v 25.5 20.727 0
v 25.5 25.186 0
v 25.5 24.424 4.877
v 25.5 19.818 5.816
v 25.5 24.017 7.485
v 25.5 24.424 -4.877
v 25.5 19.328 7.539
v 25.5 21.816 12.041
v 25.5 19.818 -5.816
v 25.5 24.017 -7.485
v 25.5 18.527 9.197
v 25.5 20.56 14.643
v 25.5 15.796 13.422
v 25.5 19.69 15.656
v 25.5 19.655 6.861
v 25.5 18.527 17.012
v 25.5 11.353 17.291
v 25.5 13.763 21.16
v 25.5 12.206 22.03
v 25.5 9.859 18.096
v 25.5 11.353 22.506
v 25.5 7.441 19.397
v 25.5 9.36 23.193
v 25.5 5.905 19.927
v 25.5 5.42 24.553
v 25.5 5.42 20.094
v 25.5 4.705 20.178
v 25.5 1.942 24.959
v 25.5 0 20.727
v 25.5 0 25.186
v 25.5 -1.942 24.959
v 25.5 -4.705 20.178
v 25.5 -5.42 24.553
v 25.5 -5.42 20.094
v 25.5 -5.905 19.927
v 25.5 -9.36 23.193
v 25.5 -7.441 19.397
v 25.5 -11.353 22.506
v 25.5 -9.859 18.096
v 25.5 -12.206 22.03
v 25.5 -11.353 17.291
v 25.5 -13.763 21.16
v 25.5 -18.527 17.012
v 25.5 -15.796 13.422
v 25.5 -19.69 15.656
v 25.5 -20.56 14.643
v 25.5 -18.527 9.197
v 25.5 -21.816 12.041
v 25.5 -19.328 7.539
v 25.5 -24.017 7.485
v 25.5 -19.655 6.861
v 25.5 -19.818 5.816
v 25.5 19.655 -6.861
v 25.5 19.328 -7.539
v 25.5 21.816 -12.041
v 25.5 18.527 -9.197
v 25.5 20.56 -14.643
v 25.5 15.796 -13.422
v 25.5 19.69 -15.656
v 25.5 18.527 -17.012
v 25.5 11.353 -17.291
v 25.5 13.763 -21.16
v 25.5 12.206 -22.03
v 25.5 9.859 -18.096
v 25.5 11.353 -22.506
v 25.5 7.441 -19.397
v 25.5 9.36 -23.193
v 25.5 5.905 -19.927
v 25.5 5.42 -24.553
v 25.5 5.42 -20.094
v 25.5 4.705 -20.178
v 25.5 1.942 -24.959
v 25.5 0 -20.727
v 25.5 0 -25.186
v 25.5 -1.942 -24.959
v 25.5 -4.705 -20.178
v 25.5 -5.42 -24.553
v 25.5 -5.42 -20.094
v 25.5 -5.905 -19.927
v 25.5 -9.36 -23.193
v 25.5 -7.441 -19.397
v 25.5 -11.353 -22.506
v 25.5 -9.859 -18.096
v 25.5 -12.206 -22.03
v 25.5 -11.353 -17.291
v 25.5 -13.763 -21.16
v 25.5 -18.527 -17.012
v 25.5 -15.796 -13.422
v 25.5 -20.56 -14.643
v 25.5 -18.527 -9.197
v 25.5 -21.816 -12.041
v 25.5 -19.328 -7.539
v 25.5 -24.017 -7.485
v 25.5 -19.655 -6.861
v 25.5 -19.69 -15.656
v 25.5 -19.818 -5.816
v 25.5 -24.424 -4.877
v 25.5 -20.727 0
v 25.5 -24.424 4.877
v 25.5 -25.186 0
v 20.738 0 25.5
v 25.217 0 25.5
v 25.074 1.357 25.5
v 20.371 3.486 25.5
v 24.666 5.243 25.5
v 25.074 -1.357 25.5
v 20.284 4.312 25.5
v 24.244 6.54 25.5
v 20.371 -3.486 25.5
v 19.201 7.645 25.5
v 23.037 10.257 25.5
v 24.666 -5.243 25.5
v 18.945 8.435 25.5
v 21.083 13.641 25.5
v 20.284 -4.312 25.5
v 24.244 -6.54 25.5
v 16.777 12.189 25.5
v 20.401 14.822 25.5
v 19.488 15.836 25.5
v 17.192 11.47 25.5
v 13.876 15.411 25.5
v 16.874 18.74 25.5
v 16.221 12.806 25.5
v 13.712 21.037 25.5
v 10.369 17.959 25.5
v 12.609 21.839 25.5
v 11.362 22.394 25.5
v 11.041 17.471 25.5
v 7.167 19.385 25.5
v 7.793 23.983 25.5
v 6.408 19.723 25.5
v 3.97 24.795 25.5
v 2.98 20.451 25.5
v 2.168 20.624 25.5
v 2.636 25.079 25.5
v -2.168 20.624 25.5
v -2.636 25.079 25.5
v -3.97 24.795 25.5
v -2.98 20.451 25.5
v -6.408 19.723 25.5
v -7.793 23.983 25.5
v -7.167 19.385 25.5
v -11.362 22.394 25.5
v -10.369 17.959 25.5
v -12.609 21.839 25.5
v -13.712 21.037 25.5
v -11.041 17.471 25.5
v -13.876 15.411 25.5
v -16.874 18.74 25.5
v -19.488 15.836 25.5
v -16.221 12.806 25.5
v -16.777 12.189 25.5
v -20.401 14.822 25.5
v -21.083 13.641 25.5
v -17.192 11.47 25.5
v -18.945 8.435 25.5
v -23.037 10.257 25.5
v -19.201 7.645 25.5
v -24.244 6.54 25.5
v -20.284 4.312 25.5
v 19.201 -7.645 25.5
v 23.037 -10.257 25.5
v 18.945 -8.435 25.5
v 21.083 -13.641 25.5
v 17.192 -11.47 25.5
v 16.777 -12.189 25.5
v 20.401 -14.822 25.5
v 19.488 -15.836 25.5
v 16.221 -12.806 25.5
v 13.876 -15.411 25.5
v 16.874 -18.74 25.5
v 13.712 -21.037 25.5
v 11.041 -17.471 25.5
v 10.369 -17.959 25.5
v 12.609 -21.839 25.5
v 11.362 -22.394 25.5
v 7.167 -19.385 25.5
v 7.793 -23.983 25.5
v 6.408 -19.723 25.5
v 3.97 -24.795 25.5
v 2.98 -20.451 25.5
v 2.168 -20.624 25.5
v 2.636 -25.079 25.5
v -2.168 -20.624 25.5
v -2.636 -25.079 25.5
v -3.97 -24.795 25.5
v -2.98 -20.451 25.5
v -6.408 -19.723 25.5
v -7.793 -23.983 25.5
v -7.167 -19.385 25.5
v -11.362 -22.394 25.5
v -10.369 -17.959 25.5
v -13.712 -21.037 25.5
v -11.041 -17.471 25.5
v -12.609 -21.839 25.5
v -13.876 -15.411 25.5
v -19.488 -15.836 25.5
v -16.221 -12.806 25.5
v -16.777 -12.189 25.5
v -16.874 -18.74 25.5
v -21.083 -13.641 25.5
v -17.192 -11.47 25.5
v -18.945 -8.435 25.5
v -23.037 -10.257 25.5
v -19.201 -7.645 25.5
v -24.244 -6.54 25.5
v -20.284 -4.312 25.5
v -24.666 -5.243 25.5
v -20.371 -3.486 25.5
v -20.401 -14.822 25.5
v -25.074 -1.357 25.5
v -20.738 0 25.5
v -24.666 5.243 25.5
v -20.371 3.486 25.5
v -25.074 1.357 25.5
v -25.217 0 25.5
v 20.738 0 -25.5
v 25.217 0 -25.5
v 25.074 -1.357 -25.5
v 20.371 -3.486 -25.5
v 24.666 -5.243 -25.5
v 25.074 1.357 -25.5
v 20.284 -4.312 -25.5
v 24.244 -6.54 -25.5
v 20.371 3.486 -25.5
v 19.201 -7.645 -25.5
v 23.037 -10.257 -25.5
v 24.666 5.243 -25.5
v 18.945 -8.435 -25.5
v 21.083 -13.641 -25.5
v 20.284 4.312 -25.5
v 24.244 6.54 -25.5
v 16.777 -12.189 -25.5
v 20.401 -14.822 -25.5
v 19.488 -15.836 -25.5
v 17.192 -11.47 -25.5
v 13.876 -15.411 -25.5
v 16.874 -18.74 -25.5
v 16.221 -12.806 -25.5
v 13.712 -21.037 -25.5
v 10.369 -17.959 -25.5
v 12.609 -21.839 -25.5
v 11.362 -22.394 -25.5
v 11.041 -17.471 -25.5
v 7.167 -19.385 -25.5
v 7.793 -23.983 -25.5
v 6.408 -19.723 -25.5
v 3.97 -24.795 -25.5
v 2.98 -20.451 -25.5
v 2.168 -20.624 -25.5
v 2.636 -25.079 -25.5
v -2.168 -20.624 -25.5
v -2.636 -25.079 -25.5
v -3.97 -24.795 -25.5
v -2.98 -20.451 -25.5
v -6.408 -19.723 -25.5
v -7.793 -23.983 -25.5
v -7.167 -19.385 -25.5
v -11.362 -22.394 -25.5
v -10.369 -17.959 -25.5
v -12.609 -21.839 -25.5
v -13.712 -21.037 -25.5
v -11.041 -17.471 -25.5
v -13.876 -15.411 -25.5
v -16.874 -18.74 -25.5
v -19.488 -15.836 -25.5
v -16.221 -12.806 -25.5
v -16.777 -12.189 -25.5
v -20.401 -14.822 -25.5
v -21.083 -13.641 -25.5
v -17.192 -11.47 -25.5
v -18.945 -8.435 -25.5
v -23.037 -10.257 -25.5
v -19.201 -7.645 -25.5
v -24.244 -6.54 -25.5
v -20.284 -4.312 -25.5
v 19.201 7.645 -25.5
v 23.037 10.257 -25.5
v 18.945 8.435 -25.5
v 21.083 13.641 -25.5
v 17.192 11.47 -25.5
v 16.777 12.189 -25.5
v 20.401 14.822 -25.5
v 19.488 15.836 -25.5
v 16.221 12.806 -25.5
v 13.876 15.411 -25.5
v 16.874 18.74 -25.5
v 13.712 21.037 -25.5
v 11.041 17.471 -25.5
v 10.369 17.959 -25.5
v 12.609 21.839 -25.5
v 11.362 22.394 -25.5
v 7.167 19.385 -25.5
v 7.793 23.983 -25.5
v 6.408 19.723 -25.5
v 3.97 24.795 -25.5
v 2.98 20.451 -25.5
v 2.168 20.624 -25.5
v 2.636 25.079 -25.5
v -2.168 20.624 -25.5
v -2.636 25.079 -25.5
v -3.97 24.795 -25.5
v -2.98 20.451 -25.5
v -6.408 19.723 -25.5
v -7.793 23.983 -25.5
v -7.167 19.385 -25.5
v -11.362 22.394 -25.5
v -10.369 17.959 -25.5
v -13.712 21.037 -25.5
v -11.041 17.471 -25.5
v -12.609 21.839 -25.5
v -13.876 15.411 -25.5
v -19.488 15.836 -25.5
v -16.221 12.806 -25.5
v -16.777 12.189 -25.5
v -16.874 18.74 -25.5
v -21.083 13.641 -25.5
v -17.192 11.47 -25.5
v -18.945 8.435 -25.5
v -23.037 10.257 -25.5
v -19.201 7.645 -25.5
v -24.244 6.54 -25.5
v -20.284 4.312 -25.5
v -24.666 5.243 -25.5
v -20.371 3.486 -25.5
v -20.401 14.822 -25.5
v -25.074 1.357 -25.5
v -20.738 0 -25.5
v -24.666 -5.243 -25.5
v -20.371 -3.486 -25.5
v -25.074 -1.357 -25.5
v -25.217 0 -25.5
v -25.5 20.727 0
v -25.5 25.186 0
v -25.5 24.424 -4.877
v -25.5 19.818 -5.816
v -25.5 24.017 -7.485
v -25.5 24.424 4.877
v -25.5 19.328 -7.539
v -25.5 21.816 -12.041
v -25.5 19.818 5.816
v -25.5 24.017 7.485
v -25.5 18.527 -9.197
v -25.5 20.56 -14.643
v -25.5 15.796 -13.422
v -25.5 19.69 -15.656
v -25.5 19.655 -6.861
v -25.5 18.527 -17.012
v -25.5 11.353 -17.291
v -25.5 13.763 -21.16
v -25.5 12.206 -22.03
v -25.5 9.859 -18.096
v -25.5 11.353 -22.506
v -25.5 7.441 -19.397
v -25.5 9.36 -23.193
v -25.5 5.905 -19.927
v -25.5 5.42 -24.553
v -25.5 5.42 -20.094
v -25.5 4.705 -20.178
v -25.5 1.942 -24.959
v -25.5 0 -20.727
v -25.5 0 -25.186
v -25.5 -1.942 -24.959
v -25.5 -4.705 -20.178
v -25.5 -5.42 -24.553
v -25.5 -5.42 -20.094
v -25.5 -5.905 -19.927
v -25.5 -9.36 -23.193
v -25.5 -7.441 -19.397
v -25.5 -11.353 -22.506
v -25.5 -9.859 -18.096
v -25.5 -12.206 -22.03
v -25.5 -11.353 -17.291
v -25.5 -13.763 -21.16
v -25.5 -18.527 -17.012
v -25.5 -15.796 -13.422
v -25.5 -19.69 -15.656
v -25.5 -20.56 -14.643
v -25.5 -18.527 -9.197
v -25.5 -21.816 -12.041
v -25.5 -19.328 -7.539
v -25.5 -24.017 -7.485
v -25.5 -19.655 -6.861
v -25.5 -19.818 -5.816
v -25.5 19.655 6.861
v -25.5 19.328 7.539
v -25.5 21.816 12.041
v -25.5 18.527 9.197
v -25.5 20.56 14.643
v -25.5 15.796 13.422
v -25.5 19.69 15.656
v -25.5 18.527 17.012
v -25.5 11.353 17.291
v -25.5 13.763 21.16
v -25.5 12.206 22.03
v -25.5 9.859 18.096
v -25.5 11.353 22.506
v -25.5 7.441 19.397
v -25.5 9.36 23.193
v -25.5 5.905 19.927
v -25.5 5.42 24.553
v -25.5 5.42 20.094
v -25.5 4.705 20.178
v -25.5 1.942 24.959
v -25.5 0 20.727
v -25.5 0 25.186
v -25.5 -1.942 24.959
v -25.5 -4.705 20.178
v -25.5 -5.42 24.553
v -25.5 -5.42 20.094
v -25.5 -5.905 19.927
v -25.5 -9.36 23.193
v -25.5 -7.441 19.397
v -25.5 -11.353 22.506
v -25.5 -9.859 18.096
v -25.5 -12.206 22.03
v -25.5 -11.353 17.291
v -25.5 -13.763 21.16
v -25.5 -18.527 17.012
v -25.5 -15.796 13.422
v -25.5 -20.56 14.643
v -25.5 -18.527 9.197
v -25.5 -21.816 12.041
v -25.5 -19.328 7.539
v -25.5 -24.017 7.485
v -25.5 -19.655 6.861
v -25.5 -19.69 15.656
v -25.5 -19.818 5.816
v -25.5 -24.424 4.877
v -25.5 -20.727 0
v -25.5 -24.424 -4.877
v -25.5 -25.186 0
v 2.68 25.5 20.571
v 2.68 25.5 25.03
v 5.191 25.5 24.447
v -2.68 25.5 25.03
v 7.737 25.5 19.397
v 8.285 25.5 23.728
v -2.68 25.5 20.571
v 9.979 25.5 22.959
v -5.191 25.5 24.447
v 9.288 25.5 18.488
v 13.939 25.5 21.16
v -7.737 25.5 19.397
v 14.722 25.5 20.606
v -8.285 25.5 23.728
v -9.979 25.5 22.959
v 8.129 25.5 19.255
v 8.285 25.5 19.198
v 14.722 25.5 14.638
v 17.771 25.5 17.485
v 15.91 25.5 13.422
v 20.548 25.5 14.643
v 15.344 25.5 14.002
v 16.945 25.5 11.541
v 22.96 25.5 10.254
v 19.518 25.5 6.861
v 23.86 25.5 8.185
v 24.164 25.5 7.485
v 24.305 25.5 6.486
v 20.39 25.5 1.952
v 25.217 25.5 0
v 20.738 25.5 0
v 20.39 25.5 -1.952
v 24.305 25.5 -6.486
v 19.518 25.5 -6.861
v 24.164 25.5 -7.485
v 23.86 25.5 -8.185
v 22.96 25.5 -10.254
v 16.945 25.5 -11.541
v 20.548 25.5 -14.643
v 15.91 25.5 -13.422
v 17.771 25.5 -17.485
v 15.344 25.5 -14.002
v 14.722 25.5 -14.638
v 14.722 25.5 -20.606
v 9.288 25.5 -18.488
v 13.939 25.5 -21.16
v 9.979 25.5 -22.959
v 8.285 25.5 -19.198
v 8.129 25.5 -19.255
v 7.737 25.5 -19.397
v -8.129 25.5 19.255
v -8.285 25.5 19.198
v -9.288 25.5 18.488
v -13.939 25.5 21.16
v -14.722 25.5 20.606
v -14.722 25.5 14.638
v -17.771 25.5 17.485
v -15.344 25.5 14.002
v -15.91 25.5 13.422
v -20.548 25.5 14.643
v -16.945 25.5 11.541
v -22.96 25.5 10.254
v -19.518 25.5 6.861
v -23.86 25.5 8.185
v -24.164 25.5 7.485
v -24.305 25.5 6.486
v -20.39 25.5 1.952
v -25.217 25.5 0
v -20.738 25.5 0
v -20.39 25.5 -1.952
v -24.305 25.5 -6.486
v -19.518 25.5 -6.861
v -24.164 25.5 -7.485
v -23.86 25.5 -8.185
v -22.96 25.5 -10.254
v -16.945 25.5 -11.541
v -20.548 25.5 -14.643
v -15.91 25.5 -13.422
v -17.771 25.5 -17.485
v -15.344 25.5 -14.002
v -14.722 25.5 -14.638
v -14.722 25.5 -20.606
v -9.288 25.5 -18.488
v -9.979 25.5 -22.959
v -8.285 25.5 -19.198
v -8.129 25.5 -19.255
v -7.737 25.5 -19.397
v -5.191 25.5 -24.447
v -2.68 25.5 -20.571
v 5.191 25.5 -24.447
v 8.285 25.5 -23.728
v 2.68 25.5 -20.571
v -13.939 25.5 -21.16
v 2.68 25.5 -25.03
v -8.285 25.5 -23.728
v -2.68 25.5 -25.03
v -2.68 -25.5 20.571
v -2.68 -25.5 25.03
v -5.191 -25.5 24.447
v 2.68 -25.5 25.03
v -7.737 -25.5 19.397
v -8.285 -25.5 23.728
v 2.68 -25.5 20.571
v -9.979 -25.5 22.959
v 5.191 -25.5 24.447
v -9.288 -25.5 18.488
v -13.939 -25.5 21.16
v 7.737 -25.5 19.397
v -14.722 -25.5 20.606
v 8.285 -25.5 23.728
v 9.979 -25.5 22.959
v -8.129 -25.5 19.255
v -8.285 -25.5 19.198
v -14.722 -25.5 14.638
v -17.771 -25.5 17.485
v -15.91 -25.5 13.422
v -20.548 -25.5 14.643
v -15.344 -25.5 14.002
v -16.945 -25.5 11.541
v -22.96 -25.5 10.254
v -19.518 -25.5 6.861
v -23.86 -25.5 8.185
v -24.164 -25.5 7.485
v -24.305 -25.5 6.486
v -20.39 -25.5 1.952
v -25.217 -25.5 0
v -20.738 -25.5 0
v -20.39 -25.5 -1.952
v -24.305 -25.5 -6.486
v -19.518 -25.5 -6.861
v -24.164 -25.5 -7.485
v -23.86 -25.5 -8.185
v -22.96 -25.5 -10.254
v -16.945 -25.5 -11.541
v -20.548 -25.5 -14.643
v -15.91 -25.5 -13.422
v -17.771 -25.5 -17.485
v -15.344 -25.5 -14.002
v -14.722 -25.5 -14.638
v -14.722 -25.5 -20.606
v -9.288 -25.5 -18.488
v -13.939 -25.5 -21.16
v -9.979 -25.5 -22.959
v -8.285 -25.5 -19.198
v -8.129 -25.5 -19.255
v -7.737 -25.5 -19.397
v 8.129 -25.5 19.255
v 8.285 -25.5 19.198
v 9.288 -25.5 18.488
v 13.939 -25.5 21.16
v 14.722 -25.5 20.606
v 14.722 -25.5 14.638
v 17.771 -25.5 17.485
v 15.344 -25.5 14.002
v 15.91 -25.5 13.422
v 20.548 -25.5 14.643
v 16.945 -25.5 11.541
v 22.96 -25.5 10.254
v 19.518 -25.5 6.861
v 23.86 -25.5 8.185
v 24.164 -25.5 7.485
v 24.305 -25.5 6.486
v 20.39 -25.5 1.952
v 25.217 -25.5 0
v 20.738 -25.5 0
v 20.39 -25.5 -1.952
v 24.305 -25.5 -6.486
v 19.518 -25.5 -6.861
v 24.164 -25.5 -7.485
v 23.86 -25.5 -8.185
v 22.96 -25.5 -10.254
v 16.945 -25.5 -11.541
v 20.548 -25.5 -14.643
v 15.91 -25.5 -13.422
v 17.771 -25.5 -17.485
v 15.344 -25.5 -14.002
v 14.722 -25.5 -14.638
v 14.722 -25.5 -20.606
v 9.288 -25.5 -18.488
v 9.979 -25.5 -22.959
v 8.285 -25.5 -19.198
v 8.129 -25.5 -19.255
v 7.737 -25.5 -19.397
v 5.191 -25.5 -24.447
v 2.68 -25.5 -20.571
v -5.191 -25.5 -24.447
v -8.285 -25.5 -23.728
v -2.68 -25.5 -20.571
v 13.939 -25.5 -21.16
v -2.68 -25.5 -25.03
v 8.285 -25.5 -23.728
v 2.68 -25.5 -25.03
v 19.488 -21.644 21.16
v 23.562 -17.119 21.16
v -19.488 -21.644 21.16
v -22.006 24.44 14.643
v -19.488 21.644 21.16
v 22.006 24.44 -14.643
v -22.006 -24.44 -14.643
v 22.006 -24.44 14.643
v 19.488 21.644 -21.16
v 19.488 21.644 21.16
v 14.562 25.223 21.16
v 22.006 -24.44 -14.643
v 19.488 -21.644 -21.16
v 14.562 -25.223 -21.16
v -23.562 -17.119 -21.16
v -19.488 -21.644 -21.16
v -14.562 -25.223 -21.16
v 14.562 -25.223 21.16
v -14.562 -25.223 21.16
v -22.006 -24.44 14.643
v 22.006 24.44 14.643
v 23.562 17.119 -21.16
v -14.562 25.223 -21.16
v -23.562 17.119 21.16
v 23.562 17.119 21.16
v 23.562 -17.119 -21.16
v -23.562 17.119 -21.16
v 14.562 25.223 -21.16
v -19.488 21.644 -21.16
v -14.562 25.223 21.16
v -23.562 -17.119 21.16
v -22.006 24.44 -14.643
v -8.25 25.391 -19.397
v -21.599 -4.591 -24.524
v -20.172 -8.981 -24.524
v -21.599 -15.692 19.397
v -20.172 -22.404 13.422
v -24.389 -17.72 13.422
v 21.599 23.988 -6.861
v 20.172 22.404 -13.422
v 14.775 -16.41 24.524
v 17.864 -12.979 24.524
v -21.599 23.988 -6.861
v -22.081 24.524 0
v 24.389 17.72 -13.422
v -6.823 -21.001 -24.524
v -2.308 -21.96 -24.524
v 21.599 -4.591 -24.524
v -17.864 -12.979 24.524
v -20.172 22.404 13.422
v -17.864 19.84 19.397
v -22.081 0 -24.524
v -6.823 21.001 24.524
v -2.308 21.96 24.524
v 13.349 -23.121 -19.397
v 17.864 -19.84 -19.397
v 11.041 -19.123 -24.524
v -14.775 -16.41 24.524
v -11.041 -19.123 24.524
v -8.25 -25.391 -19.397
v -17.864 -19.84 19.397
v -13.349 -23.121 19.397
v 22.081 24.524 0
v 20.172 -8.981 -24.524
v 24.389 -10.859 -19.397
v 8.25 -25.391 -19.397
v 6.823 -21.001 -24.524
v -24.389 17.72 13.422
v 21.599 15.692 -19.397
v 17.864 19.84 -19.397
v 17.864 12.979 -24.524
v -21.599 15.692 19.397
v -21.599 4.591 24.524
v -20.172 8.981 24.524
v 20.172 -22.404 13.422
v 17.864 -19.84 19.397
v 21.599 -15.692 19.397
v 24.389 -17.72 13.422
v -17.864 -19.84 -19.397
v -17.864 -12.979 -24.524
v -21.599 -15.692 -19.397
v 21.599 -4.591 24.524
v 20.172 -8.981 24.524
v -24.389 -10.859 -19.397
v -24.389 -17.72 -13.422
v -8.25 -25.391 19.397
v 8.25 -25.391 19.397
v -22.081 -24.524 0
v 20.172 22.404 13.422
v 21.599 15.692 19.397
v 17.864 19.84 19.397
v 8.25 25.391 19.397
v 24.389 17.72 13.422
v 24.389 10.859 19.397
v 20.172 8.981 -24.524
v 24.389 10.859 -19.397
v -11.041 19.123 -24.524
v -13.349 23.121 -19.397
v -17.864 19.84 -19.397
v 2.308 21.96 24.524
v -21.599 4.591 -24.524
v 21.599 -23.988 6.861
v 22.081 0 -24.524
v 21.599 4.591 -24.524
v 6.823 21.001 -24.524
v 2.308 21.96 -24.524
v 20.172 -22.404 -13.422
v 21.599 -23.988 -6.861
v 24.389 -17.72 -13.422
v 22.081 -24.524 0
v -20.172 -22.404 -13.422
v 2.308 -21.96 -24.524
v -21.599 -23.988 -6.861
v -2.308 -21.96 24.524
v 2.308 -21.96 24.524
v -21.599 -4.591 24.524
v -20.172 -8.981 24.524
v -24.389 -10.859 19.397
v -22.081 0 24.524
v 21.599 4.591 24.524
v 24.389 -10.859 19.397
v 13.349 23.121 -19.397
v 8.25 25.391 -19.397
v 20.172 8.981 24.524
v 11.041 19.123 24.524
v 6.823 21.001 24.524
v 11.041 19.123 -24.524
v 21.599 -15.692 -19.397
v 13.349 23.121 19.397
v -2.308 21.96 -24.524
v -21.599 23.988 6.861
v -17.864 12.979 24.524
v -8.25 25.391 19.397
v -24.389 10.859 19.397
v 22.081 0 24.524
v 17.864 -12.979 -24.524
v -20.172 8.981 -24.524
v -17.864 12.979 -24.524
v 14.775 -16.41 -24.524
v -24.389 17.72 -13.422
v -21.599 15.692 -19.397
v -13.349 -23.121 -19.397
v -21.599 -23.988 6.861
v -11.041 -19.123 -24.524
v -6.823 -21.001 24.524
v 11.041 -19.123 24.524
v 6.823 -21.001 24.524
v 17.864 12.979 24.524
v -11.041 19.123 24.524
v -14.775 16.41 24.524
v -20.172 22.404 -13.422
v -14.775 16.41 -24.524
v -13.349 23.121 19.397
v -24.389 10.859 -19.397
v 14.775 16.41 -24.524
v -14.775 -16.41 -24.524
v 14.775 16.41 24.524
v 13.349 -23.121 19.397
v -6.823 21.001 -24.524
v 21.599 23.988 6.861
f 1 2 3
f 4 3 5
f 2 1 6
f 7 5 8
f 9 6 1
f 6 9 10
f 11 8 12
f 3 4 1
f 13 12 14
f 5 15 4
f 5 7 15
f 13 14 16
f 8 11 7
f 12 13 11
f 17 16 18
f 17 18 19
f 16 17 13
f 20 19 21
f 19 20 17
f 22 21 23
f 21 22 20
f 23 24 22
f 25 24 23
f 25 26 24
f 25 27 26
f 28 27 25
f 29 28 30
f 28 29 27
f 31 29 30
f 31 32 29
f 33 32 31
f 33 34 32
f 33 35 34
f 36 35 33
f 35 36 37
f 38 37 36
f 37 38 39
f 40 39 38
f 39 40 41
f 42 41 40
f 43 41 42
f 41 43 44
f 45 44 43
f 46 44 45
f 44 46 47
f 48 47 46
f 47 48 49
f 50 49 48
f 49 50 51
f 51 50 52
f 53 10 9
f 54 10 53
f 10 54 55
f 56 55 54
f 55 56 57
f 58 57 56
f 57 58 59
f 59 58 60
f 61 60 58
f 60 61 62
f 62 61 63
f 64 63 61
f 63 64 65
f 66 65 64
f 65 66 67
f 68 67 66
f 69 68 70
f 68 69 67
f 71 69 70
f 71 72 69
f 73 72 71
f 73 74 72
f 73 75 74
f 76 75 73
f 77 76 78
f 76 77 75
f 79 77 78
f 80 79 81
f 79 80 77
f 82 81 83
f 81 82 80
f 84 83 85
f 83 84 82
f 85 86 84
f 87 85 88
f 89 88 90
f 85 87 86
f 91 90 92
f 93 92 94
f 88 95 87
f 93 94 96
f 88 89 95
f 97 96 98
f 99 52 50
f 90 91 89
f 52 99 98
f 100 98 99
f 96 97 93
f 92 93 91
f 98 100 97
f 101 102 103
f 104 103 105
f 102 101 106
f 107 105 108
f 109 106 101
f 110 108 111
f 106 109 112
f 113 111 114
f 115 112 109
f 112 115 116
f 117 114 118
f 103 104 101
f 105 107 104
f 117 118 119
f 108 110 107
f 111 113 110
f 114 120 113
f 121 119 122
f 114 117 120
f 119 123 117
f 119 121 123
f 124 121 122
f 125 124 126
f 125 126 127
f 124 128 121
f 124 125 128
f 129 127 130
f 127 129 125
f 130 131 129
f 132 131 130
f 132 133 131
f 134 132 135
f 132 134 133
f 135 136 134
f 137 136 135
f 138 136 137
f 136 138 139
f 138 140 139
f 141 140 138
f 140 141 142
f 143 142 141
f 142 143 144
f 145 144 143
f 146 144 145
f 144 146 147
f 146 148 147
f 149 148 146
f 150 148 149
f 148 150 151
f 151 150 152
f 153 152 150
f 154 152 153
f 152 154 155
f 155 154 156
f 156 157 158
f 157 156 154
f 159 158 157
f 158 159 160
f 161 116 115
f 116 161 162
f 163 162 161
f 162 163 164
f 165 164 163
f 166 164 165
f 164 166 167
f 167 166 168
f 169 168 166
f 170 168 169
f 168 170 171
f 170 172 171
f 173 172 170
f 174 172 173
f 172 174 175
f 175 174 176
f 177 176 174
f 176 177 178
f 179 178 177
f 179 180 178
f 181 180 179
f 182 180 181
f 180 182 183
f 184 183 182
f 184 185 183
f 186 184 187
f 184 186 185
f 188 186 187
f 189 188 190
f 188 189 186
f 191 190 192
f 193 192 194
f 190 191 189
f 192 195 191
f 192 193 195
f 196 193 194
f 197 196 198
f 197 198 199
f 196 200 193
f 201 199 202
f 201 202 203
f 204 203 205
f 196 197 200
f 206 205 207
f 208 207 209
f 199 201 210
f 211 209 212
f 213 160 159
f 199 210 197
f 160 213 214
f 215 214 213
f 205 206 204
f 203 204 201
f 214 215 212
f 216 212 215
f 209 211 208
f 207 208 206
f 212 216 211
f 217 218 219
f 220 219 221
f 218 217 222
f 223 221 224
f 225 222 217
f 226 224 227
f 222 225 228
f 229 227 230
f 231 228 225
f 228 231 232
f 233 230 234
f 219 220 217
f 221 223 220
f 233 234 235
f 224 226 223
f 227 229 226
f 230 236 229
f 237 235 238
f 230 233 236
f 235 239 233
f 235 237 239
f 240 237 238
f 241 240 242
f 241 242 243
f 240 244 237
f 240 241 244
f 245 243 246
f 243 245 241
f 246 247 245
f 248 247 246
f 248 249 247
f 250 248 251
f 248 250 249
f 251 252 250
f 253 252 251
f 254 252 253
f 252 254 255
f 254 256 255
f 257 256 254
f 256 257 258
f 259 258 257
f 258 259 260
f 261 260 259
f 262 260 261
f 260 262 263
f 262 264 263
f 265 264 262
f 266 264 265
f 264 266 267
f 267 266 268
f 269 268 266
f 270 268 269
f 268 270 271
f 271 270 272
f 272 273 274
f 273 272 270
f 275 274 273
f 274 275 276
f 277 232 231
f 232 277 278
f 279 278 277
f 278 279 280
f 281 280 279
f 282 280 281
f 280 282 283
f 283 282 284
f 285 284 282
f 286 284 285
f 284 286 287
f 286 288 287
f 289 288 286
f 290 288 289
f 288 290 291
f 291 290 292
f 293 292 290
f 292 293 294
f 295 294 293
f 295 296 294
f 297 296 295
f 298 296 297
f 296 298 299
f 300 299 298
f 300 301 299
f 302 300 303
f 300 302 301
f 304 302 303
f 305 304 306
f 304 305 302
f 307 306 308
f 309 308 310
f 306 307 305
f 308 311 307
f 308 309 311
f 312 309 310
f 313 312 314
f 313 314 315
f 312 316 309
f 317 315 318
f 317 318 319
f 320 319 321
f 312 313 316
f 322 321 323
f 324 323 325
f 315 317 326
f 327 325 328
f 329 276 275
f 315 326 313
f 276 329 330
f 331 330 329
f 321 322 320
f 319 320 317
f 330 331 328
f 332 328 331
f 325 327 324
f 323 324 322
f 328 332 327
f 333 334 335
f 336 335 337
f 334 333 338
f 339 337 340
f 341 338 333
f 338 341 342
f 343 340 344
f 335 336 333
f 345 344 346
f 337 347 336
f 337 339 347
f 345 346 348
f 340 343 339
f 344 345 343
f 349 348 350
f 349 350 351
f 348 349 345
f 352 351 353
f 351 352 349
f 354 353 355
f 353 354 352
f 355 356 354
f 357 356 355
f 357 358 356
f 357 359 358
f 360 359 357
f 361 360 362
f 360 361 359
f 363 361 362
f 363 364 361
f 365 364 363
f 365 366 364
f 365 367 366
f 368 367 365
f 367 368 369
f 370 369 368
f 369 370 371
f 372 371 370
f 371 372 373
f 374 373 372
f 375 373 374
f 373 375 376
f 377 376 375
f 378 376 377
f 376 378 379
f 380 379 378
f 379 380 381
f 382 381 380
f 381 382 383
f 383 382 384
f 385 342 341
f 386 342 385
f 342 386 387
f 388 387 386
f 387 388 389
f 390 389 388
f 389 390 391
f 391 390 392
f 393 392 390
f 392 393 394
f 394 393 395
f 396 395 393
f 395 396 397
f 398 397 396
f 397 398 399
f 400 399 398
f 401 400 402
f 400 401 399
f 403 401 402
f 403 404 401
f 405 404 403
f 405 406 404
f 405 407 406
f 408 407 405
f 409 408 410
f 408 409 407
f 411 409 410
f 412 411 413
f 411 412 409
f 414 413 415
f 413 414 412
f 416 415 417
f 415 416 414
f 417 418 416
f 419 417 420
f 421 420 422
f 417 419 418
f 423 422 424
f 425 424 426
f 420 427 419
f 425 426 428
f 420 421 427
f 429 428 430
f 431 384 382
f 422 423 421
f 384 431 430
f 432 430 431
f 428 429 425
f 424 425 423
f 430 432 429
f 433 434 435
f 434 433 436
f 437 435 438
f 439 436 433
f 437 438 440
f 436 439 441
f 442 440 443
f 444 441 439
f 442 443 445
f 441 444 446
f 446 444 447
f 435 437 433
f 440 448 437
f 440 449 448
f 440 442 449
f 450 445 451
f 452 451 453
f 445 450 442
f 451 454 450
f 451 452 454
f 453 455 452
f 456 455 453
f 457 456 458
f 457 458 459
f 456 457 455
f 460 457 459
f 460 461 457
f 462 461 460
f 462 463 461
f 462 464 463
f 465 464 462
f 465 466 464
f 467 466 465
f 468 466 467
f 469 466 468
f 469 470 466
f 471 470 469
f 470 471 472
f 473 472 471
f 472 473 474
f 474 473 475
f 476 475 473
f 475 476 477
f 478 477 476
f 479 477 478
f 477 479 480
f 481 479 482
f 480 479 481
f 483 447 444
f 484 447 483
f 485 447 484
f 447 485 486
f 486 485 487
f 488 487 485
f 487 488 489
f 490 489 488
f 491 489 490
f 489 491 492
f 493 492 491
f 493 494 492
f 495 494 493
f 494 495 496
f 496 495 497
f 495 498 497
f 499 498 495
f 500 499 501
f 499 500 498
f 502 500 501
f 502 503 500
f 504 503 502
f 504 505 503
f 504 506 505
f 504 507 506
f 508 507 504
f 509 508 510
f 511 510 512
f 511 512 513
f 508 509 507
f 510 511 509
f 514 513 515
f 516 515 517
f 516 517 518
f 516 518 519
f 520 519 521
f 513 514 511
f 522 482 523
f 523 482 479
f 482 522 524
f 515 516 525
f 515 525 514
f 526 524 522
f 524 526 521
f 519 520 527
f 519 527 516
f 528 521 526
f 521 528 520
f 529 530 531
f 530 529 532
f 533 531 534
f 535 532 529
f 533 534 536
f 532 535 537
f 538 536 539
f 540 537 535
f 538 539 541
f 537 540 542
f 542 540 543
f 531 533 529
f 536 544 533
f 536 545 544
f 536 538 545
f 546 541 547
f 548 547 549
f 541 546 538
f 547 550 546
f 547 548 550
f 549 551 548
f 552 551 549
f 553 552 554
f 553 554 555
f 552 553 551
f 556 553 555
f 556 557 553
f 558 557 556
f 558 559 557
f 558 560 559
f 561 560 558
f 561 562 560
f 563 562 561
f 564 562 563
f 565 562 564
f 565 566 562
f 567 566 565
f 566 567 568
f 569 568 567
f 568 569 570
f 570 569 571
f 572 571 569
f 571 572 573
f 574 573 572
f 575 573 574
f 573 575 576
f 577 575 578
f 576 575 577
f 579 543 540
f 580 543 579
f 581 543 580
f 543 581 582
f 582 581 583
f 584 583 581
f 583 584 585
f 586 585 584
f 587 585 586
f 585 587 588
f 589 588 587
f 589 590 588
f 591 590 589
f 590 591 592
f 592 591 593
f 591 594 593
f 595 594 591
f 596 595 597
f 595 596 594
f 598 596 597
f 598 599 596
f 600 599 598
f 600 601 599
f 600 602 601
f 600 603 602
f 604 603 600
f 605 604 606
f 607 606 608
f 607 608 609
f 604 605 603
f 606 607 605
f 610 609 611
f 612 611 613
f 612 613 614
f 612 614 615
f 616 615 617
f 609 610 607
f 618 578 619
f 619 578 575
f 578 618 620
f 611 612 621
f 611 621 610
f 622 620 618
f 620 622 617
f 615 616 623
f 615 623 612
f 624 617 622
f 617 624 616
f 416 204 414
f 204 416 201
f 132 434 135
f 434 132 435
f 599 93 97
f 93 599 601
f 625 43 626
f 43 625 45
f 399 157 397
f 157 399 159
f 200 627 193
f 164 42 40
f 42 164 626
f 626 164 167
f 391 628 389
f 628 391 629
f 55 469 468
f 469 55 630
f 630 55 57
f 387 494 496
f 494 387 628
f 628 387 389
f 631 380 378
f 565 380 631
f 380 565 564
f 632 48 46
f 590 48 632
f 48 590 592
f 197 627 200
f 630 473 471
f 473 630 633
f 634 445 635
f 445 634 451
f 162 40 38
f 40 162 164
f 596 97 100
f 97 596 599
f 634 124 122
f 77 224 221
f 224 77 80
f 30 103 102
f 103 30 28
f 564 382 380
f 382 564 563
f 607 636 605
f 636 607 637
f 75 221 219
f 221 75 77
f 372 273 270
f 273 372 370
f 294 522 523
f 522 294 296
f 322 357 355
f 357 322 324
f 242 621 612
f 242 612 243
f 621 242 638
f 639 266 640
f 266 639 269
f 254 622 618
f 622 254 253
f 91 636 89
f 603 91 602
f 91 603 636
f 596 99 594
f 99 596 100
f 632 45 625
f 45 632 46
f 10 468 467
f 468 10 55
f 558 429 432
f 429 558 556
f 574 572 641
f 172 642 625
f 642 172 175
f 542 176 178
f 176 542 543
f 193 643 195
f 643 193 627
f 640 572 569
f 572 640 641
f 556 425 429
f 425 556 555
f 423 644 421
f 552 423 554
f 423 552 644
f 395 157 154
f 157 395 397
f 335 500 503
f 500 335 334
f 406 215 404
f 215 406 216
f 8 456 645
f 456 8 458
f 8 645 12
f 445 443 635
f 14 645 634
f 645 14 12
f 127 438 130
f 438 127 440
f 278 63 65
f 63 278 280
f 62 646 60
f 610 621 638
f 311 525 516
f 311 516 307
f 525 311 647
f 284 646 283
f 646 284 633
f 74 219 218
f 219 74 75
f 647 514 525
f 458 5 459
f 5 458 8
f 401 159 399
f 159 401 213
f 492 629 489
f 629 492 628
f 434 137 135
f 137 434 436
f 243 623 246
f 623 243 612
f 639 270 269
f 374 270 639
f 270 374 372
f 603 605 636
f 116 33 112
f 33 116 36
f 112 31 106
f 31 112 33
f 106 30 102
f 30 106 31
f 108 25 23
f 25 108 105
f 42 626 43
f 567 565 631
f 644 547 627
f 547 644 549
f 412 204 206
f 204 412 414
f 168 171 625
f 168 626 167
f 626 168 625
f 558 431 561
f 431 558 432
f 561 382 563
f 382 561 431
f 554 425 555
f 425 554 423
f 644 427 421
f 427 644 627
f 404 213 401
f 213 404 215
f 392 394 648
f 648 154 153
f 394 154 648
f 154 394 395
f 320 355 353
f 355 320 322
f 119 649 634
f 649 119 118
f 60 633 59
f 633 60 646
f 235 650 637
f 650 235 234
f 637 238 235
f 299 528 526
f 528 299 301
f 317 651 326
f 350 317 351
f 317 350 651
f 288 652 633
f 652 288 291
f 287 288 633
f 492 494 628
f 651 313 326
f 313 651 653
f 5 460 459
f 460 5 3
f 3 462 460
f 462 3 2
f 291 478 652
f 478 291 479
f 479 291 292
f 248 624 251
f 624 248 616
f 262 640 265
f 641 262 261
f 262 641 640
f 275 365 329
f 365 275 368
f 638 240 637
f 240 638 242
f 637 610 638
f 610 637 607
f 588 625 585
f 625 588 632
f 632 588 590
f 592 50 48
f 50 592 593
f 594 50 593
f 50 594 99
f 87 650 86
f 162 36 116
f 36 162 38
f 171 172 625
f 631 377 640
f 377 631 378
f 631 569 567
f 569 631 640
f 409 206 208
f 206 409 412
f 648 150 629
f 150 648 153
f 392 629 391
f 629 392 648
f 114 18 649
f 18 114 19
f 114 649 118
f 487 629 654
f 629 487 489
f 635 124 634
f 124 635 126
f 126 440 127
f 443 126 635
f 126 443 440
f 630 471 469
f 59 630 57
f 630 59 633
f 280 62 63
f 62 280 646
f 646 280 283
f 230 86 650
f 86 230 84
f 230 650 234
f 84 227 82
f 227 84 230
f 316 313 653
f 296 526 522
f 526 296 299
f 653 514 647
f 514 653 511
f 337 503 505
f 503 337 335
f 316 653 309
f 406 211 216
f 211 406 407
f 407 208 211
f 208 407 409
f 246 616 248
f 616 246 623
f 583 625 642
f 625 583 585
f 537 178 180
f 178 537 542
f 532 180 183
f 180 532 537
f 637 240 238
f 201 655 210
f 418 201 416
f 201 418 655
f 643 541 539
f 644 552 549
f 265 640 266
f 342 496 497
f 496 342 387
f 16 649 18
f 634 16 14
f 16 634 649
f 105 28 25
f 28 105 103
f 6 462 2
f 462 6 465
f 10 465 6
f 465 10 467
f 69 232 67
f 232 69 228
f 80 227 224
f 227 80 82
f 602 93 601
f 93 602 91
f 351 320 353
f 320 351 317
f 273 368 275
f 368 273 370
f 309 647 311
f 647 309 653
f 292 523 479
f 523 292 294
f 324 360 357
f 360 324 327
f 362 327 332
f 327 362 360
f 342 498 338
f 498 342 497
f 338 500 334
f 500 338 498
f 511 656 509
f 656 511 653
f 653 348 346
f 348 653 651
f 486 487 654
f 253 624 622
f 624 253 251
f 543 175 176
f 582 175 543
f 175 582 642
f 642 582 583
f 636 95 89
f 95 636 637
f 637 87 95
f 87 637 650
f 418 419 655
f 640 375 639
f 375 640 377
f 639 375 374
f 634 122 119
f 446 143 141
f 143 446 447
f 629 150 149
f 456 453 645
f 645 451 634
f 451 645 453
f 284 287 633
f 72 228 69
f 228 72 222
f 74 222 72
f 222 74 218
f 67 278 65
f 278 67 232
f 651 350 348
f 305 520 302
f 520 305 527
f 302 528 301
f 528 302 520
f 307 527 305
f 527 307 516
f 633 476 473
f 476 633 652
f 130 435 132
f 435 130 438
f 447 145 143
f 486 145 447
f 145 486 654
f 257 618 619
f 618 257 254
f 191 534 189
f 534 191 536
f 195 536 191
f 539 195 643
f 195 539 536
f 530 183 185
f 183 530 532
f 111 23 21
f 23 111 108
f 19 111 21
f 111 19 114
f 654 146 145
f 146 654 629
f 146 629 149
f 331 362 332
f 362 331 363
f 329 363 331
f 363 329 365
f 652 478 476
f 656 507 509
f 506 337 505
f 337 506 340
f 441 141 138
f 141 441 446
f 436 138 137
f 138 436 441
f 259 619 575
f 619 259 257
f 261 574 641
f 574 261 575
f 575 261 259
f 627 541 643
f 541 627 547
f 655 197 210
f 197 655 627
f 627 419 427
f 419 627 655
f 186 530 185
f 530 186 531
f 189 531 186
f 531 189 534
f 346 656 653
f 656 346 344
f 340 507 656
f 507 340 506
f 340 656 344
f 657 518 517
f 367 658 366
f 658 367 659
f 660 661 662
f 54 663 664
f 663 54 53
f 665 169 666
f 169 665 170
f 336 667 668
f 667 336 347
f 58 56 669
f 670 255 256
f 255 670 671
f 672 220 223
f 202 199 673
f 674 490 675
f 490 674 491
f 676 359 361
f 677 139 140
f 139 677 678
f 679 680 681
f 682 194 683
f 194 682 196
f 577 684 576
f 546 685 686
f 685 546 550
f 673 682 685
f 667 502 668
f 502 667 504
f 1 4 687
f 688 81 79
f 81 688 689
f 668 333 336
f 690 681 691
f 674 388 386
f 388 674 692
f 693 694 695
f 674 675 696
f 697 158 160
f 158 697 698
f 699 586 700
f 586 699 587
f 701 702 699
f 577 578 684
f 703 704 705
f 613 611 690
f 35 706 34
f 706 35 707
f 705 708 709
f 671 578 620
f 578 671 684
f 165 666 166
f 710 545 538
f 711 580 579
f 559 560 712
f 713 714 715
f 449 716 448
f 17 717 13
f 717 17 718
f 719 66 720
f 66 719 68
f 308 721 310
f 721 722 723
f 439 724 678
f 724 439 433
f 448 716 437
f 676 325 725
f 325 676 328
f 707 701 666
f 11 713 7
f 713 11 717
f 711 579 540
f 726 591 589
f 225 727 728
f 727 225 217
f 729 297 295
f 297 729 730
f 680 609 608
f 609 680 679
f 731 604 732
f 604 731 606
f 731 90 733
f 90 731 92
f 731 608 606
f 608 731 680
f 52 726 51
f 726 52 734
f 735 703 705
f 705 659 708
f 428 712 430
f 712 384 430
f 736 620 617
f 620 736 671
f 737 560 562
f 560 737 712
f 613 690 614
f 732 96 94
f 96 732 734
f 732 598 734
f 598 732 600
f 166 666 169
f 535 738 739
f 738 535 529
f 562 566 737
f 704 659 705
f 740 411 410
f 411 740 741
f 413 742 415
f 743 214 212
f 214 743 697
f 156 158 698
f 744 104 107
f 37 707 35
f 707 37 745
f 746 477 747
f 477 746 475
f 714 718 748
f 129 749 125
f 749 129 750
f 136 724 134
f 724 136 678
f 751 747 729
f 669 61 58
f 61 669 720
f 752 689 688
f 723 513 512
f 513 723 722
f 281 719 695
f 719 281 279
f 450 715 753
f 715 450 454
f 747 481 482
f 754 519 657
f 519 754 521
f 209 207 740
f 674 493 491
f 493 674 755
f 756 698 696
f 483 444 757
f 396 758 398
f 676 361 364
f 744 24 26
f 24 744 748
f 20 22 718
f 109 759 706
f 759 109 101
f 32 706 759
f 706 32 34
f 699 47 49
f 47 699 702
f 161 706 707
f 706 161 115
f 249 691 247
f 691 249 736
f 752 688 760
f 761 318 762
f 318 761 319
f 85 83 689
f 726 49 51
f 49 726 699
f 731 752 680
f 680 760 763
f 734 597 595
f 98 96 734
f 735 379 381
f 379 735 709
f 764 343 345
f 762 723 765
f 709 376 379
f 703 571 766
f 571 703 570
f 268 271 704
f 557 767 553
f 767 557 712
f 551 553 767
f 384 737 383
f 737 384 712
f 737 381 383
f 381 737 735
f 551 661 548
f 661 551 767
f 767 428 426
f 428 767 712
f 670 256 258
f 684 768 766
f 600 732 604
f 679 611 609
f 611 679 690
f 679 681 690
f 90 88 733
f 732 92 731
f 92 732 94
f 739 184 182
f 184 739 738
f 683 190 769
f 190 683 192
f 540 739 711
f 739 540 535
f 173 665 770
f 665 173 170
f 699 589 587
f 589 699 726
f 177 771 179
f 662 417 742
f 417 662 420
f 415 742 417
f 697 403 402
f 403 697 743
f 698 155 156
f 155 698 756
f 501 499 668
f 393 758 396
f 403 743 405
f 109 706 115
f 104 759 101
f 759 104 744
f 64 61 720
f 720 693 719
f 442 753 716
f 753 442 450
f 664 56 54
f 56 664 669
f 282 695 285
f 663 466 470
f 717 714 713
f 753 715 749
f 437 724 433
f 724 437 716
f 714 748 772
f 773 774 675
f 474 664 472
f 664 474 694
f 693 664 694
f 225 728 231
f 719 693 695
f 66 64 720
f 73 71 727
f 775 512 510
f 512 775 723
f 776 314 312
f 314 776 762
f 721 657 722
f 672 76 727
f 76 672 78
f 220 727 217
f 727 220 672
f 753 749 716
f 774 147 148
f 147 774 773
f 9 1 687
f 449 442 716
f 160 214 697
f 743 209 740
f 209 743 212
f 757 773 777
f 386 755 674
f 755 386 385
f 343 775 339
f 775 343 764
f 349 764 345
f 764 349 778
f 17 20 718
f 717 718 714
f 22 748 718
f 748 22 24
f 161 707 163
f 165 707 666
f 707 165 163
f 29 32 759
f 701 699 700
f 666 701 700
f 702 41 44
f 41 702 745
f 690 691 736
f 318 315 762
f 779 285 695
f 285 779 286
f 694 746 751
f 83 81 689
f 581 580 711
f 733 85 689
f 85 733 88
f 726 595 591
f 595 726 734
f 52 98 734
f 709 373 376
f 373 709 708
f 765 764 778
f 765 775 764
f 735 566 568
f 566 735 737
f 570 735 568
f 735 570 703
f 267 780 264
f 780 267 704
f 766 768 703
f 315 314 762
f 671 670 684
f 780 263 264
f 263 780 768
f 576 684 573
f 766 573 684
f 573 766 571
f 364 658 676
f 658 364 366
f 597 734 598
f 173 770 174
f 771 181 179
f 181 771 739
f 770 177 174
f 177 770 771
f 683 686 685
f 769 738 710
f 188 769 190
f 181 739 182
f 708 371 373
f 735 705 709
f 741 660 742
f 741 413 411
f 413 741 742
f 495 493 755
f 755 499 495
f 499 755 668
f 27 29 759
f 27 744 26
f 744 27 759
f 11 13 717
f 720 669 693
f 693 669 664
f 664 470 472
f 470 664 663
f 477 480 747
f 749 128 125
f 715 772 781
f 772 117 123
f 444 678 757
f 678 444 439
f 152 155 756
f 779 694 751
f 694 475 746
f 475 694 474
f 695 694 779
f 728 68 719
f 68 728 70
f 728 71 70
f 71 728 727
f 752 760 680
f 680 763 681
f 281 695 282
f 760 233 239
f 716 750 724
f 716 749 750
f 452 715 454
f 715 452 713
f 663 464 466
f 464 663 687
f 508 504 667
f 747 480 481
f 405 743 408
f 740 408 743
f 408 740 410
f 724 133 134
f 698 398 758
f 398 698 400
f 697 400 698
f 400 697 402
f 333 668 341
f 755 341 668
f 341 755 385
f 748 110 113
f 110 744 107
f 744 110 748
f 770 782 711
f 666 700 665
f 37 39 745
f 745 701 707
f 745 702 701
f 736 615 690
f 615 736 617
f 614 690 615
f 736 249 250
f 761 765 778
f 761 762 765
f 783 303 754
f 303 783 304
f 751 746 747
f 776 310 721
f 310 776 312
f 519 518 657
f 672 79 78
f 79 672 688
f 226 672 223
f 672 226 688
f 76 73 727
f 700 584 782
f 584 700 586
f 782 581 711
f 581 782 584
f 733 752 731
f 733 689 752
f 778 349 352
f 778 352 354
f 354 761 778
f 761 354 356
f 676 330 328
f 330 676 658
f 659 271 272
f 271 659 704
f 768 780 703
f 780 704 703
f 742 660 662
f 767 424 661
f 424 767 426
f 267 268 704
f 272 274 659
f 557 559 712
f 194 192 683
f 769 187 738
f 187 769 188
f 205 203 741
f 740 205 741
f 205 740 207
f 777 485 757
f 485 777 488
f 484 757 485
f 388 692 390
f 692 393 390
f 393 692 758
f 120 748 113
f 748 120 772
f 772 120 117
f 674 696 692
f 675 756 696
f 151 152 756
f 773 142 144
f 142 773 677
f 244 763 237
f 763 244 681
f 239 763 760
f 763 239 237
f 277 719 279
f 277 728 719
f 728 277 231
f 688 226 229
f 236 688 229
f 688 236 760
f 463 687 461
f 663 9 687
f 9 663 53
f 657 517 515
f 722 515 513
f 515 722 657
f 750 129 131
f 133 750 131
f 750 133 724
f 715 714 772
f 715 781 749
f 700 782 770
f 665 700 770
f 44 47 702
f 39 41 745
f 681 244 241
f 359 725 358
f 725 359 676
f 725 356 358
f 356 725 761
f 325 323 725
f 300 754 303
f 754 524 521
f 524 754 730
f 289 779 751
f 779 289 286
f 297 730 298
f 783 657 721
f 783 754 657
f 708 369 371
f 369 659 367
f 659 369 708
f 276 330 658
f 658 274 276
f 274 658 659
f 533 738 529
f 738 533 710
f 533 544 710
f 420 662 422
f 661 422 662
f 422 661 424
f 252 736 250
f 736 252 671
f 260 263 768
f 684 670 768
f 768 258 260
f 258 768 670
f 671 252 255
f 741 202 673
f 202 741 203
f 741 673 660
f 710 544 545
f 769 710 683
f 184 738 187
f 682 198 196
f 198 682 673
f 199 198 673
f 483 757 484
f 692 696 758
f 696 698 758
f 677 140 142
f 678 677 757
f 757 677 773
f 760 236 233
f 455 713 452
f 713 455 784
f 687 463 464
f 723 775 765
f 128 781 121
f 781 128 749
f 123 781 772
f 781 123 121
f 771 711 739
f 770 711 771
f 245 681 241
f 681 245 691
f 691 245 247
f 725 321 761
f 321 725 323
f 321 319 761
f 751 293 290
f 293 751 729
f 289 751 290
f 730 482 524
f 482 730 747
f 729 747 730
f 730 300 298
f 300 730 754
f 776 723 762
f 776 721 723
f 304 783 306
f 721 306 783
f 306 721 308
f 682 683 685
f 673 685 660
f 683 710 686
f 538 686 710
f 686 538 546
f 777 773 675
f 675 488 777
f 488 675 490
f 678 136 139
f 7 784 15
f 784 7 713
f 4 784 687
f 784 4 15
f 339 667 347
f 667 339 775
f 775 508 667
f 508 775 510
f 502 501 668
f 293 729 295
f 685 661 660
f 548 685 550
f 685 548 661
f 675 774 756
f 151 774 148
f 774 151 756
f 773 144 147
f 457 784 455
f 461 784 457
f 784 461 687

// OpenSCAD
// CSG.scad - Basic example of CSG usage

csg(3);

module csg(s){
scale([s,s,s])
    difference(){
intersection() {
    color("magenta")
    cube(17, center=true);
    color("crimson")
    sphere(12);
}
color("blue")
sphere(11);
}
};
